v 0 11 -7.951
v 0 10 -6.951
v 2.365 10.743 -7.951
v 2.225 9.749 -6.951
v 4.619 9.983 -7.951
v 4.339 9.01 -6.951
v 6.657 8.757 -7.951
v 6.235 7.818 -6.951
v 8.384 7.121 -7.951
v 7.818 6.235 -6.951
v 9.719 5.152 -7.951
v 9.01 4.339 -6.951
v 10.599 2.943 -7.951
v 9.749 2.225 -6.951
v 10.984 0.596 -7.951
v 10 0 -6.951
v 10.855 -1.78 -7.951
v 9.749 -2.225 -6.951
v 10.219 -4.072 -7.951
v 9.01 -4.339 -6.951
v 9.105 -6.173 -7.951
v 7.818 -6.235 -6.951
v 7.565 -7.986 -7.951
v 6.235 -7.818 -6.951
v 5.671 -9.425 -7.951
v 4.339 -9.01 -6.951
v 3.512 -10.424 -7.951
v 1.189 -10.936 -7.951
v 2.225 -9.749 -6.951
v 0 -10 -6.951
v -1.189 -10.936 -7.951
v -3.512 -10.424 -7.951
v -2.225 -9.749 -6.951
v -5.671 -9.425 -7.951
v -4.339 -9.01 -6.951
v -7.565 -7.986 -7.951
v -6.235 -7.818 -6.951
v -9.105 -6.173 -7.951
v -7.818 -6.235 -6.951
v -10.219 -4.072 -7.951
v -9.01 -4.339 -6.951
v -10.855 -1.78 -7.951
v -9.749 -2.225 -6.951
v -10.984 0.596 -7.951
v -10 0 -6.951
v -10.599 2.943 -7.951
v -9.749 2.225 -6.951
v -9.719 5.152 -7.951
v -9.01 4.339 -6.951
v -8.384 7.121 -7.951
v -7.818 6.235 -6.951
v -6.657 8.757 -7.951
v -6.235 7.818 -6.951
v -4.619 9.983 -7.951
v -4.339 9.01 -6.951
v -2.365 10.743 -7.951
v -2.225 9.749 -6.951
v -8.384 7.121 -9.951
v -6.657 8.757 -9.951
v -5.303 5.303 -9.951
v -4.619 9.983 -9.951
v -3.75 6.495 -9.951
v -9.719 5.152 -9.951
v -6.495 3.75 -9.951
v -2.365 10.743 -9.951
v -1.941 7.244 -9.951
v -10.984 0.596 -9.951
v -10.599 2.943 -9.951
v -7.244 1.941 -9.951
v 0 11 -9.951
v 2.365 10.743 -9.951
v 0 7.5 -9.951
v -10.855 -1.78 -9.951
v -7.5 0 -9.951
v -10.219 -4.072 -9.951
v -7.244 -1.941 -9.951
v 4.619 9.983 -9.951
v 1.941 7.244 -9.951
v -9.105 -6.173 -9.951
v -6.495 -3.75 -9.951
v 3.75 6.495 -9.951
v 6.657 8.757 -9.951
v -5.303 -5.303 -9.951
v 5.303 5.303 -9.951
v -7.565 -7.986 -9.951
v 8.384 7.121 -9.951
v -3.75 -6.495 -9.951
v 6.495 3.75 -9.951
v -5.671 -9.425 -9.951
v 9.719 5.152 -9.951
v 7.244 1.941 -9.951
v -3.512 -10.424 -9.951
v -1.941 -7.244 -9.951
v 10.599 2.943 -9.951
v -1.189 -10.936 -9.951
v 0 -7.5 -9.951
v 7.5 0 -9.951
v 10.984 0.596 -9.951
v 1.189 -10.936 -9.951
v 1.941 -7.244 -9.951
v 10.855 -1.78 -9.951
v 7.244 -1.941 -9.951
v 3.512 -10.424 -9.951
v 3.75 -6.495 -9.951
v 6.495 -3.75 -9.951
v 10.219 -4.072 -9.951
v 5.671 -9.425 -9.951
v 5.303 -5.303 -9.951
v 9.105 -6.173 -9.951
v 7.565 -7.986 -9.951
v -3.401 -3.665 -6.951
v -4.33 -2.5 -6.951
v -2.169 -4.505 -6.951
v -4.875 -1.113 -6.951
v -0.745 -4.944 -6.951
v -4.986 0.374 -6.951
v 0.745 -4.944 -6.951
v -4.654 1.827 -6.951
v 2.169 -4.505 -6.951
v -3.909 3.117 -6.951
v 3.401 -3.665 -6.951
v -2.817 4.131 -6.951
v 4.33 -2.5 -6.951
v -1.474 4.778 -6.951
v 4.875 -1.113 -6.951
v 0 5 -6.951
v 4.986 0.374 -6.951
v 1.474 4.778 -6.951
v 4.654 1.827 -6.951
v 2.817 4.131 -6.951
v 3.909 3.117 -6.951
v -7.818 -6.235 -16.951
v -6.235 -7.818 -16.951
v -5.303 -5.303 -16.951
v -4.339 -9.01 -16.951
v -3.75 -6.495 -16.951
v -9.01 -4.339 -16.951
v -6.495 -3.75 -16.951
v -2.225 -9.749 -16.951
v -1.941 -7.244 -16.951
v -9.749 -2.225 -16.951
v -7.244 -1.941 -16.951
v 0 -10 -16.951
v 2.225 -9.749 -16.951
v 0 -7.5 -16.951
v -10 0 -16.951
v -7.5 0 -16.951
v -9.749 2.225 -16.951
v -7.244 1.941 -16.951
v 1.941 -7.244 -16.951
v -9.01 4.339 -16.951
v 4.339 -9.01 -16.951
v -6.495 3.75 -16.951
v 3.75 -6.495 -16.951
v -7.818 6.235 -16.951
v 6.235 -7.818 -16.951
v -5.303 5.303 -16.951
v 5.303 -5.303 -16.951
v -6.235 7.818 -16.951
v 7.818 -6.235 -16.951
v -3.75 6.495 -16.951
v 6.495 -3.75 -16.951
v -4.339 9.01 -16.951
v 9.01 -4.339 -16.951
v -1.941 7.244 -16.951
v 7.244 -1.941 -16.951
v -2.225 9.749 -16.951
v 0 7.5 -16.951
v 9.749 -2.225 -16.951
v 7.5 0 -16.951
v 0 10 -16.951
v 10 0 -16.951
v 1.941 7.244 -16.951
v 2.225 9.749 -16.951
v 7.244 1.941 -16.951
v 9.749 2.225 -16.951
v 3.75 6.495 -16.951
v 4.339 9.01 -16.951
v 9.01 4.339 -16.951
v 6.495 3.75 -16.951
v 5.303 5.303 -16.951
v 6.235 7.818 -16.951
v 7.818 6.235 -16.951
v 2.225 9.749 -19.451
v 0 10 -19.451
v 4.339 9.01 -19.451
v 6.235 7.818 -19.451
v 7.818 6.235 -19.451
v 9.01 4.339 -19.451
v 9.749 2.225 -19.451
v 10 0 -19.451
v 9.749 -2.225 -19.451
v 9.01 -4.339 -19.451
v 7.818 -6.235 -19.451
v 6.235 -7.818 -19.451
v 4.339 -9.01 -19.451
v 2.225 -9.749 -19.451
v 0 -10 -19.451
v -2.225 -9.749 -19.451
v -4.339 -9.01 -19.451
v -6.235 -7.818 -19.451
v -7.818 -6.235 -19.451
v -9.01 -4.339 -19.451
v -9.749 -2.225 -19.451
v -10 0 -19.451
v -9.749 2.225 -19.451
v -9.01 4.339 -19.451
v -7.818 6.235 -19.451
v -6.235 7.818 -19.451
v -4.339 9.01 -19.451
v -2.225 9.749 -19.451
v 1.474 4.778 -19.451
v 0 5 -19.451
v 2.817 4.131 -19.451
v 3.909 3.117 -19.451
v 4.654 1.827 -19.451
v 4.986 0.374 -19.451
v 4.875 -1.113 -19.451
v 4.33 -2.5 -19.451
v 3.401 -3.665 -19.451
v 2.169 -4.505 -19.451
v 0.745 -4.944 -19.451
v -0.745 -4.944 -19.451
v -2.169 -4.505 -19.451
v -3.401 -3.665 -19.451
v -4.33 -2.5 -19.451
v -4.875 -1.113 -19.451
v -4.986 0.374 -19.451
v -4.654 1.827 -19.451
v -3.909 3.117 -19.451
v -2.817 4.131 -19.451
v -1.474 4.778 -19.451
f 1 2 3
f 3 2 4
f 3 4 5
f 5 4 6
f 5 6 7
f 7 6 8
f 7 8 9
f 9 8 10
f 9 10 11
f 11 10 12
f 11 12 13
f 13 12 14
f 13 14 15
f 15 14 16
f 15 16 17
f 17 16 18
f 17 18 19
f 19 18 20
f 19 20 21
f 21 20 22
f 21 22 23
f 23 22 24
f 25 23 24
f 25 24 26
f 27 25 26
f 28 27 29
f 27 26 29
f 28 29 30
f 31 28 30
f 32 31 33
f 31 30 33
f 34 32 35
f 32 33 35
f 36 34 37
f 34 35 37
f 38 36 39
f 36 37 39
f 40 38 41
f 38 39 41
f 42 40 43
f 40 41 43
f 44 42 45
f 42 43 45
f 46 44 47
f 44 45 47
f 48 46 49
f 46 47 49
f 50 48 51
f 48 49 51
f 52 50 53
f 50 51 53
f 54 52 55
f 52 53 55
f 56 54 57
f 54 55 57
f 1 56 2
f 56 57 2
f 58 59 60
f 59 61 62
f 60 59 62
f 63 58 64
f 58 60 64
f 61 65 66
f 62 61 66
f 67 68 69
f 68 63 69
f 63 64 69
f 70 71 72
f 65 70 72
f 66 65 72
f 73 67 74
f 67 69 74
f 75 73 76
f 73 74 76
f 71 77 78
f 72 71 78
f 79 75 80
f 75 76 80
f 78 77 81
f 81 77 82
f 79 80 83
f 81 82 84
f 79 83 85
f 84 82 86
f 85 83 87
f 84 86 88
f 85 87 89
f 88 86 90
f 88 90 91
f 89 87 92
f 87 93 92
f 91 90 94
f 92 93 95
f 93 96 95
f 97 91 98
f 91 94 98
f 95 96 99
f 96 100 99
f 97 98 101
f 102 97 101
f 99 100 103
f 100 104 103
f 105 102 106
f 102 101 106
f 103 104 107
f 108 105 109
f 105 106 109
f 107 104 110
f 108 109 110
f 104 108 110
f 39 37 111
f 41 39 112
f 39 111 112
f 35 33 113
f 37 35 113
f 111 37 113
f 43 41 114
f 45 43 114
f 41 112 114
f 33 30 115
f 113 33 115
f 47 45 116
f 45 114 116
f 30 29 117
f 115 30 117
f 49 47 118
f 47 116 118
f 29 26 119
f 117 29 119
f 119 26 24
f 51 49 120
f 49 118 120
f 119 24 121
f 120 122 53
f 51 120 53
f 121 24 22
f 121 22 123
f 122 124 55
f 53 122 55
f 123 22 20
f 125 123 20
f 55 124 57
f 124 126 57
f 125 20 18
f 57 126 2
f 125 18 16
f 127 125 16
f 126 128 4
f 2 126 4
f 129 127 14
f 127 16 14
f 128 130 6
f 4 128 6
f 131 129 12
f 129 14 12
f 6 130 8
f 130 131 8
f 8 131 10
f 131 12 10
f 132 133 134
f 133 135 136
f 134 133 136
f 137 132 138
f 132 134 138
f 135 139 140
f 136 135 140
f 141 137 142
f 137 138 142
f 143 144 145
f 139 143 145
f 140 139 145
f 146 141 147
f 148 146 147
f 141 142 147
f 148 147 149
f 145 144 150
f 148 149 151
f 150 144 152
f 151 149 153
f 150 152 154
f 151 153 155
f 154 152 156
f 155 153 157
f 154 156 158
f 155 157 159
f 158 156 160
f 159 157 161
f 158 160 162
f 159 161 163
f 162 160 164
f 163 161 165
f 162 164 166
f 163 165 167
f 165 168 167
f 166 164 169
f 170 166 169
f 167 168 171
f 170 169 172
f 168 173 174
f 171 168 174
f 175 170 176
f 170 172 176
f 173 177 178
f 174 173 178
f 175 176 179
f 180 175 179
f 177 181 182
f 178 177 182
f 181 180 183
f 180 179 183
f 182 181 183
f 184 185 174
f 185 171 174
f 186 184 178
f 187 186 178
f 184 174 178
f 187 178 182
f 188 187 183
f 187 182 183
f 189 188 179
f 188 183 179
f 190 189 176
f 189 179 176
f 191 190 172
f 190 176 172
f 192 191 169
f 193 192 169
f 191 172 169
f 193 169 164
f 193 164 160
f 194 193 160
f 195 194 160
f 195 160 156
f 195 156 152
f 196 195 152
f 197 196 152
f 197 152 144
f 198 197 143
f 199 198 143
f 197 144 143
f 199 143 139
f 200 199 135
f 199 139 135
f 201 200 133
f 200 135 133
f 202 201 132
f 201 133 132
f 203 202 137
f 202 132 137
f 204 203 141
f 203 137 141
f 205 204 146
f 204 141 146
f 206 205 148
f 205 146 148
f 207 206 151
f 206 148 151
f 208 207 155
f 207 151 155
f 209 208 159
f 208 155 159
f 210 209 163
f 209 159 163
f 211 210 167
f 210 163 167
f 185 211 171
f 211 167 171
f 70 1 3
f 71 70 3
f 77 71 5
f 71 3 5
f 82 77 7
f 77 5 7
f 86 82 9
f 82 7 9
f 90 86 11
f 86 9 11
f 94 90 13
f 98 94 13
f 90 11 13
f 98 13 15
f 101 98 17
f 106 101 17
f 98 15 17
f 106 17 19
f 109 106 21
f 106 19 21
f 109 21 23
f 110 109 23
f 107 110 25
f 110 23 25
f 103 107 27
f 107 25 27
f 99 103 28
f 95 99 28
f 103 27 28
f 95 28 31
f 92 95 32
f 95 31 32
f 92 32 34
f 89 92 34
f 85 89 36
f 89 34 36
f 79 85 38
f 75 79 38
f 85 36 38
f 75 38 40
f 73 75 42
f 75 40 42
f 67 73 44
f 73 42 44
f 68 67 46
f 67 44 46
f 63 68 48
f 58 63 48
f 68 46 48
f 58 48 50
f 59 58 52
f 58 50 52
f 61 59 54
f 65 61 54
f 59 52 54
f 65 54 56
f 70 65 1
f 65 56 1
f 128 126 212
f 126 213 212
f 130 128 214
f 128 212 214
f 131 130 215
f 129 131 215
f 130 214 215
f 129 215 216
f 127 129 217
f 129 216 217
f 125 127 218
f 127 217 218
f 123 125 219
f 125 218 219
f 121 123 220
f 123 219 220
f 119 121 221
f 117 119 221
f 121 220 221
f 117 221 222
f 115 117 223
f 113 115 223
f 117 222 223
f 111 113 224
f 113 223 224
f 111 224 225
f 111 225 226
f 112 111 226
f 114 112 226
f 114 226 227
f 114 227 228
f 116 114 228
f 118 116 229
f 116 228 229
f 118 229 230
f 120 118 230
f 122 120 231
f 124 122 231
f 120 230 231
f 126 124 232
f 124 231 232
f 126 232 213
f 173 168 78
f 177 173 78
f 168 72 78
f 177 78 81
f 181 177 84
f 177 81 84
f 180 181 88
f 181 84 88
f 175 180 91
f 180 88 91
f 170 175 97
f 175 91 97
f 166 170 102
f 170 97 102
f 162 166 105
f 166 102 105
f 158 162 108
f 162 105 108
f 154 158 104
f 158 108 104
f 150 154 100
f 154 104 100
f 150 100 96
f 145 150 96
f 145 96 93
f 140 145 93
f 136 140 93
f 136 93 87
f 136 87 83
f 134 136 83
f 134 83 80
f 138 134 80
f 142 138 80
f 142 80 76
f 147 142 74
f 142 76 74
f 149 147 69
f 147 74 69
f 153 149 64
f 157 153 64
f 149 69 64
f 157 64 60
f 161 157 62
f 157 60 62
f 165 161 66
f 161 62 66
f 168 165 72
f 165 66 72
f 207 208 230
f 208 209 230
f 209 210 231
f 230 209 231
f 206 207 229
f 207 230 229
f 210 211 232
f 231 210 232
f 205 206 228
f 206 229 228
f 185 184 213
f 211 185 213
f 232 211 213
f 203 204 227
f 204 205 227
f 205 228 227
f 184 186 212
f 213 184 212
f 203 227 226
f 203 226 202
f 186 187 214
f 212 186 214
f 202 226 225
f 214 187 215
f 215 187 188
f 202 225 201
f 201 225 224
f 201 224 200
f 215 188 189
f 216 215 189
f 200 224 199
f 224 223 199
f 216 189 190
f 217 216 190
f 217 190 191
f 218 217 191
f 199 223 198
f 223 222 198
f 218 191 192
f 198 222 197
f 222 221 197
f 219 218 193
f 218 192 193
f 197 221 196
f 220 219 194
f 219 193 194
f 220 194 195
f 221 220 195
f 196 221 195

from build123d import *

# Parameters (mm, degrees)
F2_SIZE = 1


with BuildPart() as f1:
    # F0 (on Right) → F1 (revolve)
    with BuildSketch(Plane.YZ):
        Polygon((5, -6.950552), (5, -19.450552), (10, -19.450552), (10, -16.950552), (7.5, -16.950552), (7.5, -9.950552), (11, -9.950552), (11, -6.950552), align=None)
    revolve(axis=Axis((0, 0, -7.205679), (0, 0, -1)))

    # F2
    f2_edges = [f1.edges().sort_by_distance(p)[0] for p in [
        (0, -11, -6.950552),
    ]]
    chamfer(f2_edges, length=F2_SIZE)


solid = f1.part
